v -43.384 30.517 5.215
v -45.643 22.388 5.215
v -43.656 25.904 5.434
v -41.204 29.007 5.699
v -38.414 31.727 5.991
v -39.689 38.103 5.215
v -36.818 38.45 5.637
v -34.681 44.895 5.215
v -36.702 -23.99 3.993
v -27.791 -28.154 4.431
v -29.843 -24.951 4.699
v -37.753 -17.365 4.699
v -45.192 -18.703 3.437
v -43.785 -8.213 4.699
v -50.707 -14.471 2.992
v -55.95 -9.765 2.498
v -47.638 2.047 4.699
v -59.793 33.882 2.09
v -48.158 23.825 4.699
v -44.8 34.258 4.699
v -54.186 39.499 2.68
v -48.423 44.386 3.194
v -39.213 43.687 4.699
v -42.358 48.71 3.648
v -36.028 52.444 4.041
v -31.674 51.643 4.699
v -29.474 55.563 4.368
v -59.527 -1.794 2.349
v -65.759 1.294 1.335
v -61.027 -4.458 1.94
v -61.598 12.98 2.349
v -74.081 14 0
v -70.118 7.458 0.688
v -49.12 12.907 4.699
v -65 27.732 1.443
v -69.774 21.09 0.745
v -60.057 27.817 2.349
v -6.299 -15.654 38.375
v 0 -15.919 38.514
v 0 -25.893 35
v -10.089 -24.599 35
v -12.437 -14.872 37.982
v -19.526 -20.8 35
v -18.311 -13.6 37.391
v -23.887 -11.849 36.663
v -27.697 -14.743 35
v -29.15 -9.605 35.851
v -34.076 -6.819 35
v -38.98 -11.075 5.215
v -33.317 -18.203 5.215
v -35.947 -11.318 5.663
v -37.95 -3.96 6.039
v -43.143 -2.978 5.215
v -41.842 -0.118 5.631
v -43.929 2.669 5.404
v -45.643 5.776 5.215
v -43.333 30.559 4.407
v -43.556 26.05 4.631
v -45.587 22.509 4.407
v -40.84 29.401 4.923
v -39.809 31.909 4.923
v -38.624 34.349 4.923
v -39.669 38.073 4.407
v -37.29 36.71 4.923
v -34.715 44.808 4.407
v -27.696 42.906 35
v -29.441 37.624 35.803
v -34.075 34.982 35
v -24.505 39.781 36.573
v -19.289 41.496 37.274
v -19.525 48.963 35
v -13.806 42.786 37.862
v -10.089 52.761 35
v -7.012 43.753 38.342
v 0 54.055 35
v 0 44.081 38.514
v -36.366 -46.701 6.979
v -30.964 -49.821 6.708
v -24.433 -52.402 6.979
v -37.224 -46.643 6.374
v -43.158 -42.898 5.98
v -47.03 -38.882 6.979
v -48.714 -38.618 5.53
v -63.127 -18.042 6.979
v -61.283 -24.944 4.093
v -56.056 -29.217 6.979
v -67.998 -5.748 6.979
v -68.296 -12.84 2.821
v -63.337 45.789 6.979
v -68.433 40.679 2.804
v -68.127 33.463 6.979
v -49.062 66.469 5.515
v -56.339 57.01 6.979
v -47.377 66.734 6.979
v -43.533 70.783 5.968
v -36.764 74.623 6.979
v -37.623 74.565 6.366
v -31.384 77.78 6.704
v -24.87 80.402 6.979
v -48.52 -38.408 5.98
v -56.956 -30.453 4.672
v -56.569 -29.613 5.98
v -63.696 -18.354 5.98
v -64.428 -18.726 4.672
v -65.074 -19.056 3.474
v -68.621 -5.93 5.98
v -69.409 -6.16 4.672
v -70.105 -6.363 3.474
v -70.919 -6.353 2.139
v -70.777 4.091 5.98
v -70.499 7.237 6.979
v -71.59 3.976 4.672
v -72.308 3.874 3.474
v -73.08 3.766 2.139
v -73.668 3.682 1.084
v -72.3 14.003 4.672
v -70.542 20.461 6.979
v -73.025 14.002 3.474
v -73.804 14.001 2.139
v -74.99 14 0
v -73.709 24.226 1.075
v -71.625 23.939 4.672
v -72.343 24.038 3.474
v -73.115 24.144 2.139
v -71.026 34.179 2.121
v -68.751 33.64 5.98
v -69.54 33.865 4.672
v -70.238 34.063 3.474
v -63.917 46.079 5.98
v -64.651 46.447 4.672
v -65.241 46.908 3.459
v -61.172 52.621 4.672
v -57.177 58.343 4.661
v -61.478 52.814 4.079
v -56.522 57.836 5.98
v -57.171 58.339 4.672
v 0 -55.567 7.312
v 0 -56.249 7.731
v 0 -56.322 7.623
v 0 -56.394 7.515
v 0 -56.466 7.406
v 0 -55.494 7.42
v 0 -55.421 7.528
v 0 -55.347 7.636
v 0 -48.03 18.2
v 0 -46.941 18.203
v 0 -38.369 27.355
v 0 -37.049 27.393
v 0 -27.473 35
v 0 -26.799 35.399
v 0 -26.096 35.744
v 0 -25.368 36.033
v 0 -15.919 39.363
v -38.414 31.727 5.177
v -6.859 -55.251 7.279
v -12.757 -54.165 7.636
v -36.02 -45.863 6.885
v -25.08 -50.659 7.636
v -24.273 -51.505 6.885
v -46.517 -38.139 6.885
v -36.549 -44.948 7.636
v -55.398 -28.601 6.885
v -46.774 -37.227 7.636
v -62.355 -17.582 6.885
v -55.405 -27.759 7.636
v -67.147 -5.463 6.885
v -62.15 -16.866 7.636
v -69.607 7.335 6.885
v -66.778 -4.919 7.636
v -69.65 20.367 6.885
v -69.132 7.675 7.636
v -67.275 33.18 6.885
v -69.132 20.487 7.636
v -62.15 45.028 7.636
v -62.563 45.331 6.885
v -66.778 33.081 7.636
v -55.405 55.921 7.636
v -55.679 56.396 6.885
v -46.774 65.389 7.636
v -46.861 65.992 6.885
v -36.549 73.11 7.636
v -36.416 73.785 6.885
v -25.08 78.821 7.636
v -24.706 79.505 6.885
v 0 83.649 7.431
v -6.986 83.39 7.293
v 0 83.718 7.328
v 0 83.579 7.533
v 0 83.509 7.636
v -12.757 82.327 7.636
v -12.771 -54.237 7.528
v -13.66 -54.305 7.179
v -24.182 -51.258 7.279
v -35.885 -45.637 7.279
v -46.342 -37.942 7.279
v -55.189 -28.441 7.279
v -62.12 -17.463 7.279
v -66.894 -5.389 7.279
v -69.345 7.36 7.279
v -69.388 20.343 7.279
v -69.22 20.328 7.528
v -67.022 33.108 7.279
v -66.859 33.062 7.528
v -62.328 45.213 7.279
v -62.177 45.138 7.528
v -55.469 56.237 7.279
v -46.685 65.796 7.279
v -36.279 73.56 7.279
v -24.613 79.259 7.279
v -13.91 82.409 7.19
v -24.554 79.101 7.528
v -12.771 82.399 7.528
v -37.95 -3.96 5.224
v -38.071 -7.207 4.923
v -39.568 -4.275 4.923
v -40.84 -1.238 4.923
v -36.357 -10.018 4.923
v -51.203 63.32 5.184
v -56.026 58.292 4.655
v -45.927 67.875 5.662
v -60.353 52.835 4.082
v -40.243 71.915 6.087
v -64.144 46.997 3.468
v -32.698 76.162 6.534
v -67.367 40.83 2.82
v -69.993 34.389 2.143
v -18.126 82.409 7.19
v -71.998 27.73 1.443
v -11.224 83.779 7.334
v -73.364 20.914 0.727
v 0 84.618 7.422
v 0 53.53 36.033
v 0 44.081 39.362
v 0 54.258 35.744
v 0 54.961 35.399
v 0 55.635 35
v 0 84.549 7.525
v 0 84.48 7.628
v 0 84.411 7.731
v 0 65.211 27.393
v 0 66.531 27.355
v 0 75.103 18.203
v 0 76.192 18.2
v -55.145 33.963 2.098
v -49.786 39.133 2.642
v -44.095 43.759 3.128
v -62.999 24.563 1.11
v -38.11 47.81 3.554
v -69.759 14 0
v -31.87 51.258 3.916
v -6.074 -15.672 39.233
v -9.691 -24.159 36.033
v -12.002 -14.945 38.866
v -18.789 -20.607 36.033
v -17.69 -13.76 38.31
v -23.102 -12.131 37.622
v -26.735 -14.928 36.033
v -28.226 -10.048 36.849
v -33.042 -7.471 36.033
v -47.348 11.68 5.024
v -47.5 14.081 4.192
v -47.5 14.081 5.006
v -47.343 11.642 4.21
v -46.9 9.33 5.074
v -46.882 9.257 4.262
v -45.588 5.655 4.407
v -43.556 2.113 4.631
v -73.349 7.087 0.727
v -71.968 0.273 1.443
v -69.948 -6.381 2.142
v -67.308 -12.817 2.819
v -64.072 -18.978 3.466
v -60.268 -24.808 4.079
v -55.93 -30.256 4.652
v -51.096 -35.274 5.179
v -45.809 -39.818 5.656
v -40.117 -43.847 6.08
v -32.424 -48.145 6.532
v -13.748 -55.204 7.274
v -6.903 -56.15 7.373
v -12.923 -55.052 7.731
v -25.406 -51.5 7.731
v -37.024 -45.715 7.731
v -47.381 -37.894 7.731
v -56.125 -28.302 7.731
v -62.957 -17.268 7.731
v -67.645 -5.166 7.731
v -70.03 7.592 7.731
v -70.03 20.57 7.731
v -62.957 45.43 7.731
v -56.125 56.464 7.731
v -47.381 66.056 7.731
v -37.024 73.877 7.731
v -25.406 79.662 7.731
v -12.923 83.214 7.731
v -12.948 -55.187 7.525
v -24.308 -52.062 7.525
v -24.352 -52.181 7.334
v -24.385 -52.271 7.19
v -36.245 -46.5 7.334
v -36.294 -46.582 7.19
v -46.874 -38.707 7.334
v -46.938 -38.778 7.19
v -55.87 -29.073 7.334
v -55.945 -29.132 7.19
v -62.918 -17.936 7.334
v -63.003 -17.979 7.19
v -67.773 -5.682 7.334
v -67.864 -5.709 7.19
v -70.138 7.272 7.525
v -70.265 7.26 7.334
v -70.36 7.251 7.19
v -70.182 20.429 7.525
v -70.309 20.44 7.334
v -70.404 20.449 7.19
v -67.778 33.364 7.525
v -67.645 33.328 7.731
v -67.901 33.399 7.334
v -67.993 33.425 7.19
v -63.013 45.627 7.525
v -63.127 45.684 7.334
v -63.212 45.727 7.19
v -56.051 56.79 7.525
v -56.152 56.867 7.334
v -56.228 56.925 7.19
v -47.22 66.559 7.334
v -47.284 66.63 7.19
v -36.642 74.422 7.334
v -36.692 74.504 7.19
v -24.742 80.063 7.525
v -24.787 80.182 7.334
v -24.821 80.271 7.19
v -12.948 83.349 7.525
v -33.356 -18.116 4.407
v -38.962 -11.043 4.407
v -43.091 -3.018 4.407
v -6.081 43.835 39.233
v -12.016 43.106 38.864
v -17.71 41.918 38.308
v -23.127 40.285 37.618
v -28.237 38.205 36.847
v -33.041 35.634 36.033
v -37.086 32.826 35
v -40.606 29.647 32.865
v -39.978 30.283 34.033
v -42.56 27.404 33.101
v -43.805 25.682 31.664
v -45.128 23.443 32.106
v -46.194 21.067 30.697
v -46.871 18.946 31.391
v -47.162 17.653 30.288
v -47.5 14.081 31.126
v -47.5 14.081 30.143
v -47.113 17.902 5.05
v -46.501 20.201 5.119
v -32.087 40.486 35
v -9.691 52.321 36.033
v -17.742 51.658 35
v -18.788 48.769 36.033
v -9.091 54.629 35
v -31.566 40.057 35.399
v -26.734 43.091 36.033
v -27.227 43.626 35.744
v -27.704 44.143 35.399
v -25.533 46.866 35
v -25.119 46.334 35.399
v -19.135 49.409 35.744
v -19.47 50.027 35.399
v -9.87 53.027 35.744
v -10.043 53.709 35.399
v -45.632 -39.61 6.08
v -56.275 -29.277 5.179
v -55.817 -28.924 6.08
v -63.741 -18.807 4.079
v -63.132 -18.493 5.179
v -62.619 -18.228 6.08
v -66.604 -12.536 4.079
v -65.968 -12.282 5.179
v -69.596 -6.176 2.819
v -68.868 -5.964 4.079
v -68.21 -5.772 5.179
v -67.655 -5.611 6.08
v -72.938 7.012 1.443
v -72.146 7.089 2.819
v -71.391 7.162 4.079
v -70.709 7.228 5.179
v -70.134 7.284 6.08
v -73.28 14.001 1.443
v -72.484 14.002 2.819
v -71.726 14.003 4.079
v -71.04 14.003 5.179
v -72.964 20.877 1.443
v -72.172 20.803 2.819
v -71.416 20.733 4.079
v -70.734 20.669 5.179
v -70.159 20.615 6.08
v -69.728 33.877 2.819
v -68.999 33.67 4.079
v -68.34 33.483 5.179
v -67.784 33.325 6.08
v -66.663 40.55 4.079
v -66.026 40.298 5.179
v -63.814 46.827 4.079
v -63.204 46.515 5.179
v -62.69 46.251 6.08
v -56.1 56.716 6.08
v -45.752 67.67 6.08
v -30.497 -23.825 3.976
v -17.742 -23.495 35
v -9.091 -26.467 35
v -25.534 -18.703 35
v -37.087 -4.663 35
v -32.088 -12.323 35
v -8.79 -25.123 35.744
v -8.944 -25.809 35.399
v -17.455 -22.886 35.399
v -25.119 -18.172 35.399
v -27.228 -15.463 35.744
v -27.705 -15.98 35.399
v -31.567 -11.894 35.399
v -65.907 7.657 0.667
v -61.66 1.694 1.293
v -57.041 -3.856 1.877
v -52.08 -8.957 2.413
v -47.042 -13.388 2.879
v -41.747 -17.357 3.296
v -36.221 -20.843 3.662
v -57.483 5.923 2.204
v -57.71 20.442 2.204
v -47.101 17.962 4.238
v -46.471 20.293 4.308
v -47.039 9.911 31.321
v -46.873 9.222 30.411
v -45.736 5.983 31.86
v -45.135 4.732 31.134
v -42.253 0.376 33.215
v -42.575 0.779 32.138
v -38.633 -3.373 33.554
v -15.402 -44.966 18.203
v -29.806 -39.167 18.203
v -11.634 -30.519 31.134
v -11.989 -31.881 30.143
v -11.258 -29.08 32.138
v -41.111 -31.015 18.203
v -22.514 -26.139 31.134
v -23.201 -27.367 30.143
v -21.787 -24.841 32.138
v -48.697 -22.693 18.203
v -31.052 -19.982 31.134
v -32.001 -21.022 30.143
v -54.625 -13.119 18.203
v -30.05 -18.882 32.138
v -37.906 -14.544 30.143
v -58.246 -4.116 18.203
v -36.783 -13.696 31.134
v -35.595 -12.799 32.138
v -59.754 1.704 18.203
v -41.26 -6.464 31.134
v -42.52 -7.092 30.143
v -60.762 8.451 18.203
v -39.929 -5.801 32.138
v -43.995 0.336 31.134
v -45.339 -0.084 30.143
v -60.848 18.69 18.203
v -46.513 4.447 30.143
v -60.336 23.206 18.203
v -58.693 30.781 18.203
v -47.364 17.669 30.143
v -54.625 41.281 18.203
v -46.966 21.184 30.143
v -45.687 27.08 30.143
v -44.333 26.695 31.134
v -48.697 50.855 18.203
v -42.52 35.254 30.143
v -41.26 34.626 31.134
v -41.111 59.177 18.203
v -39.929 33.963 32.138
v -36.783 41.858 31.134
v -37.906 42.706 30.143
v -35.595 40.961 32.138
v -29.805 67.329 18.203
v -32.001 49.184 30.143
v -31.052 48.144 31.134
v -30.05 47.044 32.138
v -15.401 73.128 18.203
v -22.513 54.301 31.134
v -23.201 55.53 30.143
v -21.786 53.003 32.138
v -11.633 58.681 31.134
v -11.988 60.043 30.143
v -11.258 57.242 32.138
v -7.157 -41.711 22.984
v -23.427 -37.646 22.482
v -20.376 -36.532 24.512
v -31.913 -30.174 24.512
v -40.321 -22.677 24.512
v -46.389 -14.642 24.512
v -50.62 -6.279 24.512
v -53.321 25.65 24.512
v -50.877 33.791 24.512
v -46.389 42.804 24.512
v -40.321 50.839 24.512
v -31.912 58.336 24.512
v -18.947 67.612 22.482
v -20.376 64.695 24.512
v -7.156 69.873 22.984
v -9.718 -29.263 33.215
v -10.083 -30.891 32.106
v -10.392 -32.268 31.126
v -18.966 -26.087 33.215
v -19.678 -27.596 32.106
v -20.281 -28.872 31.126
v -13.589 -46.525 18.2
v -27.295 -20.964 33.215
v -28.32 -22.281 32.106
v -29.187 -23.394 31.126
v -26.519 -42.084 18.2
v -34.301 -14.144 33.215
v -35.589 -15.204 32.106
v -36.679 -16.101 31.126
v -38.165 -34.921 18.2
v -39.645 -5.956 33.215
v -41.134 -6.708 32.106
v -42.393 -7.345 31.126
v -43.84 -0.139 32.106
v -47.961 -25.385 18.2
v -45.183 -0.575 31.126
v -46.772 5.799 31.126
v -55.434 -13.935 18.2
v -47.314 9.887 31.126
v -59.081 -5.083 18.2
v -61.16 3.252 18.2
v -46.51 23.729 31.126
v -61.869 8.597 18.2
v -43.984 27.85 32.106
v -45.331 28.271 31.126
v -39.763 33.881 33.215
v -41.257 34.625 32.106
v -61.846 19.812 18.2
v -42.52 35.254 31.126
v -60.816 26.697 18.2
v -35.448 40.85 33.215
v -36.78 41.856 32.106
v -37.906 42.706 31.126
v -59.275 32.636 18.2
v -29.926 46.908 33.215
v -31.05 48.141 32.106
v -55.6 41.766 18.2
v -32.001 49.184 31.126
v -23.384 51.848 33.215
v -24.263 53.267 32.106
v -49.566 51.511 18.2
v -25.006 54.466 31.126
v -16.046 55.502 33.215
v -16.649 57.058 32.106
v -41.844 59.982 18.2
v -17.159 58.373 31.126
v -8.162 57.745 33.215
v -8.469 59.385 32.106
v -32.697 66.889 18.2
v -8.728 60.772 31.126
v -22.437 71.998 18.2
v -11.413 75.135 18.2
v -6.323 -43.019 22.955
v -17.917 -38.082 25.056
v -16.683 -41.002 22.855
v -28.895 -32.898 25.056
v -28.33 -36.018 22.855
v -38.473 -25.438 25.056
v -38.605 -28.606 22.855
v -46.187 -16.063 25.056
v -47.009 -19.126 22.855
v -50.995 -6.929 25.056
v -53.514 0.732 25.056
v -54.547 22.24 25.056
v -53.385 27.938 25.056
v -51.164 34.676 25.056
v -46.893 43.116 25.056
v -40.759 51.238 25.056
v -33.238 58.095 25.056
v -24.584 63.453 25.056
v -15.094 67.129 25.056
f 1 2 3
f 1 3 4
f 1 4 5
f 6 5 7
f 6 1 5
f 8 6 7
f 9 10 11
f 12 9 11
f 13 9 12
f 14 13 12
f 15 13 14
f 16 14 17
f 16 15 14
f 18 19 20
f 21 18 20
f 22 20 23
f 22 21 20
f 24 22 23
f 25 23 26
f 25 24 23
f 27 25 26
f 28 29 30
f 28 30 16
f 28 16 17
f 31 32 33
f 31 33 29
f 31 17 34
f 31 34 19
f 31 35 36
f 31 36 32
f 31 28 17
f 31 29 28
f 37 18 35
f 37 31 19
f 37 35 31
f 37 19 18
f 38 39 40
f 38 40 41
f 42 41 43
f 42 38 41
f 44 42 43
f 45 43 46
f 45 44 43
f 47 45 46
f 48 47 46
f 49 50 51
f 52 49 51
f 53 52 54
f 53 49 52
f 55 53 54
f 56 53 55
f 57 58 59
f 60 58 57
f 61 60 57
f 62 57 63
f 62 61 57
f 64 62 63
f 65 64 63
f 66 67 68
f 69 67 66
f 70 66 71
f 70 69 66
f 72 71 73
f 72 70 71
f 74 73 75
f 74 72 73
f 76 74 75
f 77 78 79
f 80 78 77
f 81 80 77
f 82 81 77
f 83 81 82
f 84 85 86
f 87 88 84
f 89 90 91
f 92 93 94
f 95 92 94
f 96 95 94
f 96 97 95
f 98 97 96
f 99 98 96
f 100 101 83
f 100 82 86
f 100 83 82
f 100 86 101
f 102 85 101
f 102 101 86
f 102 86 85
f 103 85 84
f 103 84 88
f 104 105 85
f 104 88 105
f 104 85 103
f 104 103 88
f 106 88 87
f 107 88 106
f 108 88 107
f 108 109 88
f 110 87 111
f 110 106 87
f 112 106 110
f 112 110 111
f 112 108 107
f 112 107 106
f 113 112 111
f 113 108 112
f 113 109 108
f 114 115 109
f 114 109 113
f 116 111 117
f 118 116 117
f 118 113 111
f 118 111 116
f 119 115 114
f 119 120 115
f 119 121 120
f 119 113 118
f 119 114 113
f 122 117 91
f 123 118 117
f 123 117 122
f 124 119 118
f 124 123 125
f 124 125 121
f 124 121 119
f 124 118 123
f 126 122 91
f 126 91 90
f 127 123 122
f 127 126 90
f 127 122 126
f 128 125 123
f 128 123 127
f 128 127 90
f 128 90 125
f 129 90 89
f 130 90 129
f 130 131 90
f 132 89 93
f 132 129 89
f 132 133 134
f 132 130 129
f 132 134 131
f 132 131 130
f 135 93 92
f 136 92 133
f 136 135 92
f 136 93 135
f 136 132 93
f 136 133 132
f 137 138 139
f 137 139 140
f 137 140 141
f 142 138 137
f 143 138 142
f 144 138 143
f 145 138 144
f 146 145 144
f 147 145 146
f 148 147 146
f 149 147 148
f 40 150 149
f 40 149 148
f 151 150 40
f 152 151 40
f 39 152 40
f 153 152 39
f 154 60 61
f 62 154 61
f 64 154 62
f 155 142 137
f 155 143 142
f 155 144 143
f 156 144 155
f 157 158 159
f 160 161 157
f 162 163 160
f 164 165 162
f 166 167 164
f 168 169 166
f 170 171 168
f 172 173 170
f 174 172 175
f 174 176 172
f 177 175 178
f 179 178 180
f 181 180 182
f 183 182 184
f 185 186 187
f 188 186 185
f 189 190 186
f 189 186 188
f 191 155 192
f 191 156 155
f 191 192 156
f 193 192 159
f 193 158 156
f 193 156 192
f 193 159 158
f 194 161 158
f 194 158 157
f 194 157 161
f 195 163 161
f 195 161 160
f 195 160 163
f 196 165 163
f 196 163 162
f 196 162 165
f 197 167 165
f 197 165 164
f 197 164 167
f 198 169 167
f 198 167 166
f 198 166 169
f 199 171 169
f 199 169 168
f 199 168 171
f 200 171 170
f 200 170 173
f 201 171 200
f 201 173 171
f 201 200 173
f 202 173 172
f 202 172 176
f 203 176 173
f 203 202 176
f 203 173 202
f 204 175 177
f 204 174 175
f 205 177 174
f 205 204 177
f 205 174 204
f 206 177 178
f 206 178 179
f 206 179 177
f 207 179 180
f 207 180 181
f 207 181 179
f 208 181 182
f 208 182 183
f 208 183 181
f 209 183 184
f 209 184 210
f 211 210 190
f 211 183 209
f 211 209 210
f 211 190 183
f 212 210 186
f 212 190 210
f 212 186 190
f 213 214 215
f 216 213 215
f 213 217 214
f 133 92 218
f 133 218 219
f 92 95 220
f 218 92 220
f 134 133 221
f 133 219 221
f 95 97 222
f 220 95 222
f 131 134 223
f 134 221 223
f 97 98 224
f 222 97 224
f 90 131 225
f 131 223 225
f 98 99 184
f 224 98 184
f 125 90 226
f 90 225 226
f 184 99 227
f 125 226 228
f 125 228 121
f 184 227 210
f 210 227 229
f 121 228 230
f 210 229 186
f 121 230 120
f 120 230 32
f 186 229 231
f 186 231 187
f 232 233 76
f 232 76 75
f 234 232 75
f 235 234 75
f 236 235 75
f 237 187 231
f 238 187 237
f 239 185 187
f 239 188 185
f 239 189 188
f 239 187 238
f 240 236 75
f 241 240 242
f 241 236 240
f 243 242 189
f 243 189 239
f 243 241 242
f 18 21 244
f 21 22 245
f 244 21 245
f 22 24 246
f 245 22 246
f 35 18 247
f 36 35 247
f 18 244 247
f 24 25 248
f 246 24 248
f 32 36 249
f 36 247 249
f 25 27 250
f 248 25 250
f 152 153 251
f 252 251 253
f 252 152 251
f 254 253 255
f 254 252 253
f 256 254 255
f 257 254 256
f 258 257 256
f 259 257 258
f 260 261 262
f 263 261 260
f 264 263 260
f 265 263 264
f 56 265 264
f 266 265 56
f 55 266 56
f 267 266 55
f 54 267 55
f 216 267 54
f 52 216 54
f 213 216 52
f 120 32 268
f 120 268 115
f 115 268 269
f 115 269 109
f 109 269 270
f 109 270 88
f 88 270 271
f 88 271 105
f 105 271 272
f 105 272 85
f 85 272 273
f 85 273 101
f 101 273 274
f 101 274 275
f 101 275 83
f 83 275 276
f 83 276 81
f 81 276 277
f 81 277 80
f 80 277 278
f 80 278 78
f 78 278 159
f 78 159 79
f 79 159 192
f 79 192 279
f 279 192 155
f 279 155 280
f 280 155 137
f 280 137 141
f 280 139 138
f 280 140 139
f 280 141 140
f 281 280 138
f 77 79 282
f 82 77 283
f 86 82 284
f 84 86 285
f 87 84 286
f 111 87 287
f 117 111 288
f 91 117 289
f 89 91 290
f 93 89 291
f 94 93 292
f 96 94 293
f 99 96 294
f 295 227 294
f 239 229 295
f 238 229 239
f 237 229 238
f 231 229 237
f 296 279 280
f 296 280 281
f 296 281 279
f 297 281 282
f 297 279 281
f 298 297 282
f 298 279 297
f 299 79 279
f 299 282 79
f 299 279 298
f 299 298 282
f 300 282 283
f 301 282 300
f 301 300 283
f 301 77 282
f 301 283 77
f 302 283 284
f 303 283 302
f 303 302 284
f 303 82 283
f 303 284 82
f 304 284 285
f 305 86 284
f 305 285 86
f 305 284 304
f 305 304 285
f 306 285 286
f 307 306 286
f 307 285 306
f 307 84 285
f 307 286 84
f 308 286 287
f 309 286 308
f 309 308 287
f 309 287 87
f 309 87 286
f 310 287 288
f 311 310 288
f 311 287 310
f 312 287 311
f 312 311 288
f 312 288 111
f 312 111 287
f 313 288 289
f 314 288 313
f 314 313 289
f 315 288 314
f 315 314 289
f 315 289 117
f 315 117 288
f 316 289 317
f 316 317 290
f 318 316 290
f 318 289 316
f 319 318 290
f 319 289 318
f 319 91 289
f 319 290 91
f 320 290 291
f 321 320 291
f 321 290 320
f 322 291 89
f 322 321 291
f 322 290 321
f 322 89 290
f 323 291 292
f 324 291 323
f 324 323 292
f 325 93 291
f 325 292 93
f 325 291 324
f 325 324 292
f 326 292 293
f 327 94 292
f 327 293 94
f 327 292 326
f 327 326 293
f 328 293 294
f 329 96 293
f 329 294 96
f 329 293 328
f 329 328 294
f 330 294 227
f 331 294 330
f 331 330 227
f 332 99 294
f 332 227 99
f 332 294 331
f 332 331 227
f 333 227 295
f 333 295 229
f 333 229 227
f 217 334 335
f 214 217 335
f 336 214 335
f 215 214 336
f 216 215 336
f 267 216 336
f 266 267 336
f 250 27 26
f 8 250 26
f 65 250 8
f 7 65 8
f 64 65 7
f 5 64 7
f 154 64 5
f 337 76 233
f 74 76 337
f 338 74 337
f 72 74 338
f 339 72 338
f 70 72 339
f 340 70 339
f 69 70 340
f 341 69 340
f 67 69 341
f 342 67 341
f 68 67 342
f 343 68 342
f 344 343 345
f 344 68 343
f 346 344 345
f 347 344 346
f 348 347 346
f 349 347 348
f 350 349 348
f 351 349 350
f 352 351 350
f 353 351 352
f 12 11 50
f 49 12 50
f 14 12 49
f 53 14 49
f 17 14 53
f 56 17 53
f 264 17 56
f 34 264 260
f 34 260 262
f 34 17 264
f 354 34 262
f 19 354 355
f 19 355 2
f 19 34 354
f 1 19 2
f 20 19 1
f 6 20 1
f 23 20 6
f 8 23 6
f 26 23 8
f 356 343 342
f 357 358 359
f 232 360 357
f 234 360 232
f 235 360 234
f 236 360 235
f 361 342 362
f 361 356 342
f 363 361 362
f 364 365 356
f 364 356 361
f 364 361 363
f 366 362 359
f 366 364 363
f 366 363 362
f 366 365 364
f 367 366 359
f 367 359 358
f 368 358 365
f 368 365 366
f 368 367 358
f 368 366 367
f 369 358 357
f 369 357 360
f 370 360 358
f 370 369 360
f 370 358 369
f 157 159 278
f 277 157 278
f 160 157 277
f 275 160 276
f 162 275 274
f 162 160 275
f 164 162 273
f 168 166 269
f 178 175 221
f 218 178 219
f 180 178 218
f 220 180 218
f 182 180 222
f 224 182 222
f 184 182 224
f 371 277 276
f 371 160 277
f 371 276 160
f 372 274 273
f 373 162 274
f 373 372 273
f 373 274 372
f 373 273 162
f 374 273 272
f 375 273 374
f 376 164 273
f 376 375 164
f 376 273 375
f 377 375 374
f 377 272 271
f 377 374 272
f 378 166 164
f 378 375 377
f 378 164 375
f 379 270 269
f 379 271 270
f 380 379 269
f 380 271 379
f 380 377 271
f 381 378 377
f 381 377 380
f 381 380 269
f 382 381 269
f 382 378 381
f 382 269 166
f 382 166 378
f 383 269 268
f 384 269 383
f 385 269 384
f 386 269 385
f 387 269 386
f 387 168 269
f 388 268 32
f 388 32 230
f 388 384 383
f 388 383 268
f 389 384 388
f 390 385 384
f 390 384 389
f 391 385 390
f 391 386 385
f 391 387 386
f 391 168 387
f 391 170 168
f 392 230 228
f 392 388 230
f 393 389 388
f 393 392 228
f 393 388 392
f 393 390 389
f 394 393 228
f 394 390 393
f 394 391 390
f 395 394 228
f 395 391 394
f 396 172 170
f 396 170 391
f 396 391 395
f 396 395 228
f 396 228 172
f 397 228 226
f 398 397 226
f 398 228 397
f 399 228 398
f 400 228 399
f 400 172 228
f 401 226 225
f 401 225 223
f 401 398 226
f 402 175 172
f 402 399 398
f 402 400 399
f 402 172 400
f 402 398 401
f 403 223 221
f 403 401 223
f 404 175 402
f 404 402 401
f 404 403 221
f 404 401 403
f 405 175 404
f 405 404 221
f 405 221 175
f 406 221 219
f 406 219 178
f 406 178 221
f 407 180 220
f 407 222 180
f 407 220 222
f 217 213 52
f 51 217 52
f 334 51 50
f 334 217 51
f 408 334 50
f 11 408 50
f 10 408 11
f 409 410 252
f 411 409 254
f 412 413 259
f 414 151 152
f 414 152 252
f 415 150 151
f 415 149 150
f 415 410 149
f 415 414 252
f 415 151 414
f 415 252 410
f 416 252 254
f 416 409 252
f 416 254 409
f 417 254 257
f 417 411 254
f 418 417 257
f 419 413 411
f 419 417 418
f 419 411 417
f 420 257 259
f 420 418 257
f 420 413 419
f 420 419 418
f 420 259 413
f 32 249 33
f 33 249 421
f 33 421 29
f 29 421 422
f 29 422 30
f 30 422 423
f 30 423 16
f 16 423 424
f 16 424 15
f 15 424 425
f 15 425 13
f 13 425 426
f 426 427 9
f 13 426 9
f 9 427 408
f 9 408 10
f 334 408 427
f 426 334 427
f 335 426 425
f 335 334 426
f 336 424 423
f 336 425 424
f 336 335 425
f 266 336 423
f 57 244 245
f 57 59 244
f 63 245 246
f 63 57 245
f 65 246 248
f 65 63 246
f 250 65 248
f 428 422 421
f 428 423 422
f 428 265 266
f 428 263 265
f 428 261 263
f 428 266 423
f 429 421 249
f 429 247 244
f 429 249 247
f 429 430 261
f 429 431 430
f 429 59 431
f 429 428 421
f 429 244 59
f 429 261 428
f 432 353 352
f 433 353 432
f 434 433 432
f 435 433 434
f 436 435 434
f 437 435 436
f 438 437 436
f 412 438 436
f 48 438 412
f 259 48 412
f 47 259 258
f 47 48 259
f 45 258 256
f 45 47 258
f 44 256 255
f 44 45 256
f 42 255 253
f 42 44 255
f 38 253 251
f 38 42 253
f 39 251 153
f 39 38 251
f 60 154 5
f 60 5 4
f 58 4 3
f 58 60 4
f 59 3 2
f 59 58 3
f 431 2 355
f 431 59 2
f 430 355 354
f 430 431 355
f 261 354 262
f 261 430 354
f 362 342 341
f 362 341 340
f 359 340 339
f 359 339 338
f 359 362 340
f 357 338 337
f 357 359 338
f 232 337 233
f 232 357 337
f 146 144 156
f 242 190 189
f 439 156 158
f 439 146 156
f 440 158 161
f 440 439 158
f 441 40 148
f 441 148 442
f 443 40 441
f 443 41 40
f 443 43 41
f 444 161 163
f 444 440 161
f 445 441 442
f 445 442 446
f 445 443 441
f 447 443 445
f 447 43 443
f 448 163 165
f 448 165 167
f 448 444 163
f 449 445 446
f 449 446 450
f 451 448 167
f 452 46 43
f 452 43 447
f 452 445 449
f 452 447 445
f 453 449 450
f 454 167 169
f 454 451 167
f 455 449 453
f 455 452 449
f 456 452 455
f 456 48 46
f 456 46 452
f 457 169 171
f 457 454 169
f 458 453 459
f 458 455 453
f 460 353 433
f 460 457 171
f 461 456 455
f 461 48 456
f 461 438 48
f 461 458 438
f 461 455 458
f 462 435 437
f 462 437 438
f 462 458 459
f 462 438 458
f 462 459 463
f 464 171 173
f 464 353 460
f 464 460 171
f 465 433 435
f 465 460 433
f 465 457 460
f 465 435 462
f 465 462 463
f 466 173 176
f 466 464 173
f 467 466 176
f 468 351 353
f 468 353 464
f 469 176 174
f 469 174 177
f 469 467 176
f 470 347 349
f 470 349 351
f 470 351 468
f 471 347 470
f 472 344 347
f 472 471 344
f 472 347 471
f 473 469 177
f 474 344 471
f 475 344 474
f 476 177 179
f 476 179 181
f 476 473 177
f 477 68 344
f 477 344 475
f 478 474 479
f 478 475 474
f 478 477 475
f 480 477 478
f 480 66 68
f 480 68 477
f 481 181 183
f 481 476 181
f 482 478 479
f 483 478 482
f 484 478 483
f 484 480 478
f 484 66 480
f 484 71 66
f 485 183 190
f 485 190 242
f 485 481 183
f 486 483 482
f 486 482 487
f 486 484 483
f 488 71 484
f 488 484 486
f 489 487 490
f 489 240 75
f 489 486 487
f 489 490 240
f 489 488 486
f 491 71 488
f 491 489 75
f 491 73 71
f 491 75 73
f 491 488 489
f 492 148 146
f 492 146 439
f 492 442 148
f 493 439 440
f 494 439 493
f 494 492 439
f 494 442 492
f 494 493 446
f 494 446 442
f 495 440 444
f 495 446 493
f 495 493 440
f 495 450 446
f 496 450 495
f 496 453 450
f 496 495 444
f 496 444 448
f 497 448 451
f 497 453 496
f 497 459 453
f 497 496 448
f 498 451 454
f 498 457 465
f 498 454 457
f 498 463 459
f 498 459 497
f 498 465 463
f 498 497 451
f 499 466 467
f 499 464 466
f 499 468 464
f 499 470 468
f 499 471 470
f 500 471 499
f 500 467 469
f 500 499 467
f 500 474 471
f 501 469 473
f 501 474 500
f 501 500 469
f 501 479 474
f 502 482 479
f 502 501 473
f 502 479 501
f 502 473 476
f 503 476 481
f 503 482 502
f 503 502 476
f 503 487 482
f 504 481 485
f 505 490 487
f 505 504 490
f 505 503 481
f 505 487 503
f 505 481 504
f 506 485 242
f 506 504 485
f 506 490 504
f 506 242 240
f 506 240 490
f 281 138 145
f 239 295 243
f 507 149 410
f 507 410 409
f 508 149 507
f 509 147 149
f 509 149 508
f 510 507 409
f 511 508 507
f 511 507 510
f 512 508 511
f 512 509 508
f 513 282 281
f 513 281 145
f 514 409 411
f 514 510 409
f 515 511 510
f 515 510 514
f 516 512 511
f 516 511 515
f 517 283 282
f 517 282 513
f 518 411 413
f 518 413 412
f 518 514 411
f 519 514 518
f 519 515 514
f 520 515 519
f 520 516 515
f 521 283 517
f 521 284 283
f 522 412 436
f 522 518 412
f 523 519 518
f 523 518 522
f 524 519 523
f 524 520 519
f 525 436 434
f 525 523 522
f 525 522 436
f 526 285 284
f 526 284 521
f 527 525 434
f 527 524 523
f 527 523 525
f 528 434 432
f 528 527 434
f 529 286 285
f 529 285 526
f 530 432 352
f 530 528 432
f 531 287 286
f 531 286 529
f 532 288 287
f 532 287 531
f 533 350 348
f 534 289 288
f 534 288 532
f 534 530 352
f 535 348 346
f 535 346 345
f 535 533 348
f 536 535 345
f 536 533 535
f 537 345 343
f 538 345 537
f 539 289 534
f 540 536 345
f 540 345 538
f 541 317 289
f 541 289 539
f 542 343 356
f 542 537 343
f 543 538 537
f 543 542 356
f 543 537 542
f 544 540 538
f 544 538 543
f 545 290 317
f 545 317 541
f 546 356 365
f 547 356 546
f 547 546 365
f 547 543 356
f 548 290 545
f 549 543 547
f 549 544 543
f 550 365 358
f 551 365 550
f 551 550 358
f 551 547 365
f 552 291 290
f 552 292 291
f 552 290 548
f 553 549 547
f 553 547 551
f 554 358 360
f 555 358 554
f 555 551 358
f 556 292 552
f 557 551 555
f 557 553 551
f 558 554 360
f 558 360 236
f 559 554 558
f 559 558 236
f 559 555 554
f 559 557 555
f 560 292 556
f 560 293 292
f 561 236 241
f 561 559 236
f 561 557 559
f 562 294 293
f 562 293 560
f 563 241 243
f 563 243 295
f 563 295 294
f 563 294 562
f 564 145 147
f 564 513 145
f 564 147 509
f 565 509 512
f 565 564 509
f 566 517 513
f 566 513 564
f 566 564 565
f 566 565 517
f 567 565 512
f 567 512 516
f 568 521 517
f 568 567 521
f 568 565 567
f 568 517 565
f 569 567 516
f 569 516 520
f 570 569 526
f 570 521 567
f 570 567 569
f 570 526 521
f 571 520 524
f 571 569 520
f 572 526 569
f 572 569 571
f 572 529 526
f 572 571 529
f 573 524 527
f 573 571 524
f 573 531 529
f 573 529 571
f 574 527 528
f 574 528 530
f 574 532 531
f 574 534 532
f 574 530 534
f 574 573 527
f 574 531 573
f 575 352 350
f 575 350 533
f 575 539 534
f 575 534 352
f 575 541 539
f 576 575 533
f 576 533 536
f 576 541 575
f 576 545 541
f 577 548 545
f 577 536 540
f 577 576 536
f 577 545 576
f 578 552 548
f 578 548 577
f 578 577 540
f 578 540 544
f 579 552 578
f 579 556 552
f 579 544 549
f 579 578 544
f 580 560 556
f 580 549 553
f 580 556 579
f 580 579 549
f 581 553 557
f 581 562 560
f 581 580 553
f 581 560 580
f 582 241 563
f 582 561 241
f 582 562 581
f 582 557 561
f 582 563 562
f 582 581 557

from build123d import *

# Parameters (mm, degrees)
F1_ANGLE = 180
F3_DEPTH = 16
F4_DEPTH = 10
F6_DEPTH = 100
F8_DEPTH = 120


# Not quite as in the source:
# - a feature names something its author has since deleted; it is built from what else it names


with BuildPart() as f1:
    # F0 (on Right) → F1 (revolve)
    with BuildSketch(Plane.YZ):
        with BuildLine():
            ThreePointArc((-55.3474134292, 7.6361638259), (-42.1679434739, 22.9837707191), (-25.8934941894, 35))
            Line((-25.8934941894, 35), (-27.4734756347, 35))
            ThreePointArc((-27.4734756347, 35), (-43.3676619435, 22.9550852631), (-56.2490525257, 7.7309299136))
            Line((-56.2490525257, 7.7309299136), (-55.3474134292, 7.6361638259))
        make_face()
        with BuildLine():
            Line((-27.4734756347, 35), (-25.8934941894, 35))
            Line((-25.8934941894, 35), (13.2809915289, 48.8023323047))
            Line((13.2809915289, 48.8023323047), (13.2809915289, 20.0909134001))
            Line((13.2809915289, 20.0909134001), (13.2809915289, 13.8023323047))
            Line((13.2809915289, 13.8023323047), (-32.3117841705, 5.2150216288))
            Line((-32.3117841705, 5.2150216288), (-29.5376830425, 4.9234518512))
            Line((-29.5376830425, 4.9234518512), (13.4290663861, 13.0161555837))
            Line((13.4290663861, 13.0161555837), (14.0809915289, 13.1389444171))
            Line((14.0809915289, 13.1389444171), (14.0809915289, 13.8023323047))
            Line((14.0809915289, 13.8023323047), (14.0809915289, 19.0225130607))
            Line((14.0809915289, 19.0225130607), (14.0809915289, 49.6023323047))
            Line((14.0809915289, 49.6023323047), (13.0151457916, 49.5568692779))
            Line((13.0151457916, 49.5568692779), (-25.3683284456, 36.0332337607))
            ThreePointArc((-25.3683284456, 36.0332337607), (-26.4512940518, 35.5785386451), (-27.4734756347, 35))
        make_face()
        with BuildLine():
            ThreePointArc((-60, 0), (-58.0031545142, 3.4887455953), (-55.8525170272, 6.8848457297))
            Line((-55.8525170272, 6.8848457297), (-56.7494178536, 6.9791138051))
            ThreePointArc((-56.7494178536, 6.9791138051), (-59.2223551886, 3.0035715179), (-61.4870824341, -1.0941554183))
            Line((-61.4870824341, -1.0941554183), (-59.8519251428, -0.786176721))
            Line((-59.8519251428, -0.786176721), (-53.878297587, 0.3389444171))
            Line((-53.878297587, 0.3389444171), (-32.2788666941, 4.407155239))
            Line((-32.2788666941, 4.407155239), (-35.052967822, 4.6987250166))
            Line((-35.052967822, 4.6987250166), (-60, 0))
        make_face()
        with BuildLine():
            ThreePointArc((-55.8525170272, 6.8848457297), (-55.6009099356, 7.2611398951), (-55.3474134292, 7.6361638259))
            Line((-55.3474134292, 7.6361638259), (-56.2490525257, 7.7309299136))
            ThreePointArc((-56.2490525257, 7.7309299136), (-56.500169896, 7.3556439459), (-56.7494178536, 6.9791138051))
            Line((-56.7494178536, 6.9791138051), (-55.8525170272, 6.8848457297))
        make_face()
        Polygon((-29.5376830425, 4.9234518512), (-32.3117841705, 5.2150216288), (-35.052967822, 4.6987250166), (-32.2788666941, 4.407155239), align=None)
    revolve(axis=Axis((0, 14.0809915289, 34.3124226827), (0, 0, -1)), revolution_arc=F1_ANGLE)

    # F2 (on Top) → F3 (cut)
    with BuildSketch(Plane.XY):
        with BuildLine():
            add(Edge.make_bspline(
                [(-40, 15), (-40, -129.8528137424), (28.2842712475, -27.4264068712), (96.5685424949, 75), (0, 75)],
                knots=[1.5707963268, 1.5707963268, 1.5707963268, 3.926990817, 3.926990817, 6.2831853072, 6.2831853072, 6.2831853072], degree=2, weights=[1, 0.3826834324, 1, 0.3826834324, 1]))
            add(Edge.make_bspline(
                [(0, 75), (-39.4701752826, 75), (-39.9964442864, 15.8)],
                knots=[0, 0, 0, 1.5574625984, 1.5574625984, 1.5574625984], degree=2, weights=[1, 0.7118052168, 1]))
            Line((-39.9964442864, 15.8), (0, 15.8))
            Line((0, 15.8), (0, 15))
            Line((0, 15), (-40, 15))
        make_face()
        with BuildLine():
            Line((0, 15.8), (-39.9964442864, 15.8))
            add(Edge.make_bspline(
                [(-39.9964442864, 15.8), (-40, 15.4000177794), (-40, 15)],
                knots=[1.5574625984, 1.5574625984, 1.5574625984, 1.5707963268, 1.5707963268, 1.5707963268], degree=2, weights=[1, 0.9999777765, 1]))
            Line((-40, 15), (0, 15))
            Line((0, 15), (0, 15.8))
        make_face()
    extrude(amount=F3_DEPTH, mode=Mode.SUBTRACT)

    # F2 (on Top) → F4 (cut)
    with BuildSketch(Plane.XY):
        with BuildLine():
            add(Edge.make_bspline(
                [(-40, 15), (-40, -129.8528137424), (28.2842712475, -27.4264068712), (96.5685424949, 75), (0, 75)],
                knots=[1.5707963268, 1.5707963268, 1.5707963268, 3.926990817, 3.926990817, 6.2831853072, 6.2831853072, 6.2831853072], degree=2, weights=[1, 0.3826834324, 1, 0.3826834324, 1]))
            add(Edge.make_bspline(
                [(0, 75), (-39.4701752826, 75), (-39.9964442864, 15.8)],
                knots=[0, 0, 0, 1.5574625984, 1.5574625984, 1.5574625984], degree=2, weights=[1, 0.7118052168, 1]))
            Line((-39.9964442864, 15.8), (0, 15.8))
            Line((0, 15.8), (0, 15))
            Line((0, 15), (-40, 15))
        make_face()
    extrude(amount=F4_DEPTH, mode=Mode.SUBTRACT)

    # F5 (on Top) → F6 (cut)
    with BuildSketch(Plane.XY):
        with BuildLine():
            add(Edge.make_bspline(
                [(-47.5, 14.081414789), (-47.5, -37.8801094381), (23.75, -11.8993473246), (95, 14.081414789), (23.75, 40.0621769025), (-47.5, 66.042939016), (-47.5, 14.081414789)],
                knots=[0, 0, 0, 2.0943951024, 2.0943951024, 4.1887902048, 4.1887902048, 6.2831853072, 6.2831853072, 6.2831853072], degree=2, weights=[1, 0.5, 1, 0.5, 1, 0.5, 1]))
        make_face()
    extrude(amount=F6_DEPTH, mode=Mode.SUBTRACT)

    # F7 (on Right) → F8 (cut)
    with BuildSketch(Plane.YZ):
        Polygon((94.4246426225, 0), (14, 0), (14, -1.5881112777), (94.696611166, -1.5881112777), align=None)
        Polygon((-66.4246426225, 0), (0, 0), (14, 0), (-58.0279476422, 7.5704423547), align=None)
        Polygon((86.0279476422, 7.5704423547), (14, 0), (94.4246426225, 0), align=None)
        Polygon((14, 0), (0, 0), (-66.4246426225, 0), (-66.696611166, -1.5881112777), (14, -1.5881112777), align=None)
    extrude(amount=-F8_DEPTH, mode=Mode.SUBTRACT)


solid = f1.part
